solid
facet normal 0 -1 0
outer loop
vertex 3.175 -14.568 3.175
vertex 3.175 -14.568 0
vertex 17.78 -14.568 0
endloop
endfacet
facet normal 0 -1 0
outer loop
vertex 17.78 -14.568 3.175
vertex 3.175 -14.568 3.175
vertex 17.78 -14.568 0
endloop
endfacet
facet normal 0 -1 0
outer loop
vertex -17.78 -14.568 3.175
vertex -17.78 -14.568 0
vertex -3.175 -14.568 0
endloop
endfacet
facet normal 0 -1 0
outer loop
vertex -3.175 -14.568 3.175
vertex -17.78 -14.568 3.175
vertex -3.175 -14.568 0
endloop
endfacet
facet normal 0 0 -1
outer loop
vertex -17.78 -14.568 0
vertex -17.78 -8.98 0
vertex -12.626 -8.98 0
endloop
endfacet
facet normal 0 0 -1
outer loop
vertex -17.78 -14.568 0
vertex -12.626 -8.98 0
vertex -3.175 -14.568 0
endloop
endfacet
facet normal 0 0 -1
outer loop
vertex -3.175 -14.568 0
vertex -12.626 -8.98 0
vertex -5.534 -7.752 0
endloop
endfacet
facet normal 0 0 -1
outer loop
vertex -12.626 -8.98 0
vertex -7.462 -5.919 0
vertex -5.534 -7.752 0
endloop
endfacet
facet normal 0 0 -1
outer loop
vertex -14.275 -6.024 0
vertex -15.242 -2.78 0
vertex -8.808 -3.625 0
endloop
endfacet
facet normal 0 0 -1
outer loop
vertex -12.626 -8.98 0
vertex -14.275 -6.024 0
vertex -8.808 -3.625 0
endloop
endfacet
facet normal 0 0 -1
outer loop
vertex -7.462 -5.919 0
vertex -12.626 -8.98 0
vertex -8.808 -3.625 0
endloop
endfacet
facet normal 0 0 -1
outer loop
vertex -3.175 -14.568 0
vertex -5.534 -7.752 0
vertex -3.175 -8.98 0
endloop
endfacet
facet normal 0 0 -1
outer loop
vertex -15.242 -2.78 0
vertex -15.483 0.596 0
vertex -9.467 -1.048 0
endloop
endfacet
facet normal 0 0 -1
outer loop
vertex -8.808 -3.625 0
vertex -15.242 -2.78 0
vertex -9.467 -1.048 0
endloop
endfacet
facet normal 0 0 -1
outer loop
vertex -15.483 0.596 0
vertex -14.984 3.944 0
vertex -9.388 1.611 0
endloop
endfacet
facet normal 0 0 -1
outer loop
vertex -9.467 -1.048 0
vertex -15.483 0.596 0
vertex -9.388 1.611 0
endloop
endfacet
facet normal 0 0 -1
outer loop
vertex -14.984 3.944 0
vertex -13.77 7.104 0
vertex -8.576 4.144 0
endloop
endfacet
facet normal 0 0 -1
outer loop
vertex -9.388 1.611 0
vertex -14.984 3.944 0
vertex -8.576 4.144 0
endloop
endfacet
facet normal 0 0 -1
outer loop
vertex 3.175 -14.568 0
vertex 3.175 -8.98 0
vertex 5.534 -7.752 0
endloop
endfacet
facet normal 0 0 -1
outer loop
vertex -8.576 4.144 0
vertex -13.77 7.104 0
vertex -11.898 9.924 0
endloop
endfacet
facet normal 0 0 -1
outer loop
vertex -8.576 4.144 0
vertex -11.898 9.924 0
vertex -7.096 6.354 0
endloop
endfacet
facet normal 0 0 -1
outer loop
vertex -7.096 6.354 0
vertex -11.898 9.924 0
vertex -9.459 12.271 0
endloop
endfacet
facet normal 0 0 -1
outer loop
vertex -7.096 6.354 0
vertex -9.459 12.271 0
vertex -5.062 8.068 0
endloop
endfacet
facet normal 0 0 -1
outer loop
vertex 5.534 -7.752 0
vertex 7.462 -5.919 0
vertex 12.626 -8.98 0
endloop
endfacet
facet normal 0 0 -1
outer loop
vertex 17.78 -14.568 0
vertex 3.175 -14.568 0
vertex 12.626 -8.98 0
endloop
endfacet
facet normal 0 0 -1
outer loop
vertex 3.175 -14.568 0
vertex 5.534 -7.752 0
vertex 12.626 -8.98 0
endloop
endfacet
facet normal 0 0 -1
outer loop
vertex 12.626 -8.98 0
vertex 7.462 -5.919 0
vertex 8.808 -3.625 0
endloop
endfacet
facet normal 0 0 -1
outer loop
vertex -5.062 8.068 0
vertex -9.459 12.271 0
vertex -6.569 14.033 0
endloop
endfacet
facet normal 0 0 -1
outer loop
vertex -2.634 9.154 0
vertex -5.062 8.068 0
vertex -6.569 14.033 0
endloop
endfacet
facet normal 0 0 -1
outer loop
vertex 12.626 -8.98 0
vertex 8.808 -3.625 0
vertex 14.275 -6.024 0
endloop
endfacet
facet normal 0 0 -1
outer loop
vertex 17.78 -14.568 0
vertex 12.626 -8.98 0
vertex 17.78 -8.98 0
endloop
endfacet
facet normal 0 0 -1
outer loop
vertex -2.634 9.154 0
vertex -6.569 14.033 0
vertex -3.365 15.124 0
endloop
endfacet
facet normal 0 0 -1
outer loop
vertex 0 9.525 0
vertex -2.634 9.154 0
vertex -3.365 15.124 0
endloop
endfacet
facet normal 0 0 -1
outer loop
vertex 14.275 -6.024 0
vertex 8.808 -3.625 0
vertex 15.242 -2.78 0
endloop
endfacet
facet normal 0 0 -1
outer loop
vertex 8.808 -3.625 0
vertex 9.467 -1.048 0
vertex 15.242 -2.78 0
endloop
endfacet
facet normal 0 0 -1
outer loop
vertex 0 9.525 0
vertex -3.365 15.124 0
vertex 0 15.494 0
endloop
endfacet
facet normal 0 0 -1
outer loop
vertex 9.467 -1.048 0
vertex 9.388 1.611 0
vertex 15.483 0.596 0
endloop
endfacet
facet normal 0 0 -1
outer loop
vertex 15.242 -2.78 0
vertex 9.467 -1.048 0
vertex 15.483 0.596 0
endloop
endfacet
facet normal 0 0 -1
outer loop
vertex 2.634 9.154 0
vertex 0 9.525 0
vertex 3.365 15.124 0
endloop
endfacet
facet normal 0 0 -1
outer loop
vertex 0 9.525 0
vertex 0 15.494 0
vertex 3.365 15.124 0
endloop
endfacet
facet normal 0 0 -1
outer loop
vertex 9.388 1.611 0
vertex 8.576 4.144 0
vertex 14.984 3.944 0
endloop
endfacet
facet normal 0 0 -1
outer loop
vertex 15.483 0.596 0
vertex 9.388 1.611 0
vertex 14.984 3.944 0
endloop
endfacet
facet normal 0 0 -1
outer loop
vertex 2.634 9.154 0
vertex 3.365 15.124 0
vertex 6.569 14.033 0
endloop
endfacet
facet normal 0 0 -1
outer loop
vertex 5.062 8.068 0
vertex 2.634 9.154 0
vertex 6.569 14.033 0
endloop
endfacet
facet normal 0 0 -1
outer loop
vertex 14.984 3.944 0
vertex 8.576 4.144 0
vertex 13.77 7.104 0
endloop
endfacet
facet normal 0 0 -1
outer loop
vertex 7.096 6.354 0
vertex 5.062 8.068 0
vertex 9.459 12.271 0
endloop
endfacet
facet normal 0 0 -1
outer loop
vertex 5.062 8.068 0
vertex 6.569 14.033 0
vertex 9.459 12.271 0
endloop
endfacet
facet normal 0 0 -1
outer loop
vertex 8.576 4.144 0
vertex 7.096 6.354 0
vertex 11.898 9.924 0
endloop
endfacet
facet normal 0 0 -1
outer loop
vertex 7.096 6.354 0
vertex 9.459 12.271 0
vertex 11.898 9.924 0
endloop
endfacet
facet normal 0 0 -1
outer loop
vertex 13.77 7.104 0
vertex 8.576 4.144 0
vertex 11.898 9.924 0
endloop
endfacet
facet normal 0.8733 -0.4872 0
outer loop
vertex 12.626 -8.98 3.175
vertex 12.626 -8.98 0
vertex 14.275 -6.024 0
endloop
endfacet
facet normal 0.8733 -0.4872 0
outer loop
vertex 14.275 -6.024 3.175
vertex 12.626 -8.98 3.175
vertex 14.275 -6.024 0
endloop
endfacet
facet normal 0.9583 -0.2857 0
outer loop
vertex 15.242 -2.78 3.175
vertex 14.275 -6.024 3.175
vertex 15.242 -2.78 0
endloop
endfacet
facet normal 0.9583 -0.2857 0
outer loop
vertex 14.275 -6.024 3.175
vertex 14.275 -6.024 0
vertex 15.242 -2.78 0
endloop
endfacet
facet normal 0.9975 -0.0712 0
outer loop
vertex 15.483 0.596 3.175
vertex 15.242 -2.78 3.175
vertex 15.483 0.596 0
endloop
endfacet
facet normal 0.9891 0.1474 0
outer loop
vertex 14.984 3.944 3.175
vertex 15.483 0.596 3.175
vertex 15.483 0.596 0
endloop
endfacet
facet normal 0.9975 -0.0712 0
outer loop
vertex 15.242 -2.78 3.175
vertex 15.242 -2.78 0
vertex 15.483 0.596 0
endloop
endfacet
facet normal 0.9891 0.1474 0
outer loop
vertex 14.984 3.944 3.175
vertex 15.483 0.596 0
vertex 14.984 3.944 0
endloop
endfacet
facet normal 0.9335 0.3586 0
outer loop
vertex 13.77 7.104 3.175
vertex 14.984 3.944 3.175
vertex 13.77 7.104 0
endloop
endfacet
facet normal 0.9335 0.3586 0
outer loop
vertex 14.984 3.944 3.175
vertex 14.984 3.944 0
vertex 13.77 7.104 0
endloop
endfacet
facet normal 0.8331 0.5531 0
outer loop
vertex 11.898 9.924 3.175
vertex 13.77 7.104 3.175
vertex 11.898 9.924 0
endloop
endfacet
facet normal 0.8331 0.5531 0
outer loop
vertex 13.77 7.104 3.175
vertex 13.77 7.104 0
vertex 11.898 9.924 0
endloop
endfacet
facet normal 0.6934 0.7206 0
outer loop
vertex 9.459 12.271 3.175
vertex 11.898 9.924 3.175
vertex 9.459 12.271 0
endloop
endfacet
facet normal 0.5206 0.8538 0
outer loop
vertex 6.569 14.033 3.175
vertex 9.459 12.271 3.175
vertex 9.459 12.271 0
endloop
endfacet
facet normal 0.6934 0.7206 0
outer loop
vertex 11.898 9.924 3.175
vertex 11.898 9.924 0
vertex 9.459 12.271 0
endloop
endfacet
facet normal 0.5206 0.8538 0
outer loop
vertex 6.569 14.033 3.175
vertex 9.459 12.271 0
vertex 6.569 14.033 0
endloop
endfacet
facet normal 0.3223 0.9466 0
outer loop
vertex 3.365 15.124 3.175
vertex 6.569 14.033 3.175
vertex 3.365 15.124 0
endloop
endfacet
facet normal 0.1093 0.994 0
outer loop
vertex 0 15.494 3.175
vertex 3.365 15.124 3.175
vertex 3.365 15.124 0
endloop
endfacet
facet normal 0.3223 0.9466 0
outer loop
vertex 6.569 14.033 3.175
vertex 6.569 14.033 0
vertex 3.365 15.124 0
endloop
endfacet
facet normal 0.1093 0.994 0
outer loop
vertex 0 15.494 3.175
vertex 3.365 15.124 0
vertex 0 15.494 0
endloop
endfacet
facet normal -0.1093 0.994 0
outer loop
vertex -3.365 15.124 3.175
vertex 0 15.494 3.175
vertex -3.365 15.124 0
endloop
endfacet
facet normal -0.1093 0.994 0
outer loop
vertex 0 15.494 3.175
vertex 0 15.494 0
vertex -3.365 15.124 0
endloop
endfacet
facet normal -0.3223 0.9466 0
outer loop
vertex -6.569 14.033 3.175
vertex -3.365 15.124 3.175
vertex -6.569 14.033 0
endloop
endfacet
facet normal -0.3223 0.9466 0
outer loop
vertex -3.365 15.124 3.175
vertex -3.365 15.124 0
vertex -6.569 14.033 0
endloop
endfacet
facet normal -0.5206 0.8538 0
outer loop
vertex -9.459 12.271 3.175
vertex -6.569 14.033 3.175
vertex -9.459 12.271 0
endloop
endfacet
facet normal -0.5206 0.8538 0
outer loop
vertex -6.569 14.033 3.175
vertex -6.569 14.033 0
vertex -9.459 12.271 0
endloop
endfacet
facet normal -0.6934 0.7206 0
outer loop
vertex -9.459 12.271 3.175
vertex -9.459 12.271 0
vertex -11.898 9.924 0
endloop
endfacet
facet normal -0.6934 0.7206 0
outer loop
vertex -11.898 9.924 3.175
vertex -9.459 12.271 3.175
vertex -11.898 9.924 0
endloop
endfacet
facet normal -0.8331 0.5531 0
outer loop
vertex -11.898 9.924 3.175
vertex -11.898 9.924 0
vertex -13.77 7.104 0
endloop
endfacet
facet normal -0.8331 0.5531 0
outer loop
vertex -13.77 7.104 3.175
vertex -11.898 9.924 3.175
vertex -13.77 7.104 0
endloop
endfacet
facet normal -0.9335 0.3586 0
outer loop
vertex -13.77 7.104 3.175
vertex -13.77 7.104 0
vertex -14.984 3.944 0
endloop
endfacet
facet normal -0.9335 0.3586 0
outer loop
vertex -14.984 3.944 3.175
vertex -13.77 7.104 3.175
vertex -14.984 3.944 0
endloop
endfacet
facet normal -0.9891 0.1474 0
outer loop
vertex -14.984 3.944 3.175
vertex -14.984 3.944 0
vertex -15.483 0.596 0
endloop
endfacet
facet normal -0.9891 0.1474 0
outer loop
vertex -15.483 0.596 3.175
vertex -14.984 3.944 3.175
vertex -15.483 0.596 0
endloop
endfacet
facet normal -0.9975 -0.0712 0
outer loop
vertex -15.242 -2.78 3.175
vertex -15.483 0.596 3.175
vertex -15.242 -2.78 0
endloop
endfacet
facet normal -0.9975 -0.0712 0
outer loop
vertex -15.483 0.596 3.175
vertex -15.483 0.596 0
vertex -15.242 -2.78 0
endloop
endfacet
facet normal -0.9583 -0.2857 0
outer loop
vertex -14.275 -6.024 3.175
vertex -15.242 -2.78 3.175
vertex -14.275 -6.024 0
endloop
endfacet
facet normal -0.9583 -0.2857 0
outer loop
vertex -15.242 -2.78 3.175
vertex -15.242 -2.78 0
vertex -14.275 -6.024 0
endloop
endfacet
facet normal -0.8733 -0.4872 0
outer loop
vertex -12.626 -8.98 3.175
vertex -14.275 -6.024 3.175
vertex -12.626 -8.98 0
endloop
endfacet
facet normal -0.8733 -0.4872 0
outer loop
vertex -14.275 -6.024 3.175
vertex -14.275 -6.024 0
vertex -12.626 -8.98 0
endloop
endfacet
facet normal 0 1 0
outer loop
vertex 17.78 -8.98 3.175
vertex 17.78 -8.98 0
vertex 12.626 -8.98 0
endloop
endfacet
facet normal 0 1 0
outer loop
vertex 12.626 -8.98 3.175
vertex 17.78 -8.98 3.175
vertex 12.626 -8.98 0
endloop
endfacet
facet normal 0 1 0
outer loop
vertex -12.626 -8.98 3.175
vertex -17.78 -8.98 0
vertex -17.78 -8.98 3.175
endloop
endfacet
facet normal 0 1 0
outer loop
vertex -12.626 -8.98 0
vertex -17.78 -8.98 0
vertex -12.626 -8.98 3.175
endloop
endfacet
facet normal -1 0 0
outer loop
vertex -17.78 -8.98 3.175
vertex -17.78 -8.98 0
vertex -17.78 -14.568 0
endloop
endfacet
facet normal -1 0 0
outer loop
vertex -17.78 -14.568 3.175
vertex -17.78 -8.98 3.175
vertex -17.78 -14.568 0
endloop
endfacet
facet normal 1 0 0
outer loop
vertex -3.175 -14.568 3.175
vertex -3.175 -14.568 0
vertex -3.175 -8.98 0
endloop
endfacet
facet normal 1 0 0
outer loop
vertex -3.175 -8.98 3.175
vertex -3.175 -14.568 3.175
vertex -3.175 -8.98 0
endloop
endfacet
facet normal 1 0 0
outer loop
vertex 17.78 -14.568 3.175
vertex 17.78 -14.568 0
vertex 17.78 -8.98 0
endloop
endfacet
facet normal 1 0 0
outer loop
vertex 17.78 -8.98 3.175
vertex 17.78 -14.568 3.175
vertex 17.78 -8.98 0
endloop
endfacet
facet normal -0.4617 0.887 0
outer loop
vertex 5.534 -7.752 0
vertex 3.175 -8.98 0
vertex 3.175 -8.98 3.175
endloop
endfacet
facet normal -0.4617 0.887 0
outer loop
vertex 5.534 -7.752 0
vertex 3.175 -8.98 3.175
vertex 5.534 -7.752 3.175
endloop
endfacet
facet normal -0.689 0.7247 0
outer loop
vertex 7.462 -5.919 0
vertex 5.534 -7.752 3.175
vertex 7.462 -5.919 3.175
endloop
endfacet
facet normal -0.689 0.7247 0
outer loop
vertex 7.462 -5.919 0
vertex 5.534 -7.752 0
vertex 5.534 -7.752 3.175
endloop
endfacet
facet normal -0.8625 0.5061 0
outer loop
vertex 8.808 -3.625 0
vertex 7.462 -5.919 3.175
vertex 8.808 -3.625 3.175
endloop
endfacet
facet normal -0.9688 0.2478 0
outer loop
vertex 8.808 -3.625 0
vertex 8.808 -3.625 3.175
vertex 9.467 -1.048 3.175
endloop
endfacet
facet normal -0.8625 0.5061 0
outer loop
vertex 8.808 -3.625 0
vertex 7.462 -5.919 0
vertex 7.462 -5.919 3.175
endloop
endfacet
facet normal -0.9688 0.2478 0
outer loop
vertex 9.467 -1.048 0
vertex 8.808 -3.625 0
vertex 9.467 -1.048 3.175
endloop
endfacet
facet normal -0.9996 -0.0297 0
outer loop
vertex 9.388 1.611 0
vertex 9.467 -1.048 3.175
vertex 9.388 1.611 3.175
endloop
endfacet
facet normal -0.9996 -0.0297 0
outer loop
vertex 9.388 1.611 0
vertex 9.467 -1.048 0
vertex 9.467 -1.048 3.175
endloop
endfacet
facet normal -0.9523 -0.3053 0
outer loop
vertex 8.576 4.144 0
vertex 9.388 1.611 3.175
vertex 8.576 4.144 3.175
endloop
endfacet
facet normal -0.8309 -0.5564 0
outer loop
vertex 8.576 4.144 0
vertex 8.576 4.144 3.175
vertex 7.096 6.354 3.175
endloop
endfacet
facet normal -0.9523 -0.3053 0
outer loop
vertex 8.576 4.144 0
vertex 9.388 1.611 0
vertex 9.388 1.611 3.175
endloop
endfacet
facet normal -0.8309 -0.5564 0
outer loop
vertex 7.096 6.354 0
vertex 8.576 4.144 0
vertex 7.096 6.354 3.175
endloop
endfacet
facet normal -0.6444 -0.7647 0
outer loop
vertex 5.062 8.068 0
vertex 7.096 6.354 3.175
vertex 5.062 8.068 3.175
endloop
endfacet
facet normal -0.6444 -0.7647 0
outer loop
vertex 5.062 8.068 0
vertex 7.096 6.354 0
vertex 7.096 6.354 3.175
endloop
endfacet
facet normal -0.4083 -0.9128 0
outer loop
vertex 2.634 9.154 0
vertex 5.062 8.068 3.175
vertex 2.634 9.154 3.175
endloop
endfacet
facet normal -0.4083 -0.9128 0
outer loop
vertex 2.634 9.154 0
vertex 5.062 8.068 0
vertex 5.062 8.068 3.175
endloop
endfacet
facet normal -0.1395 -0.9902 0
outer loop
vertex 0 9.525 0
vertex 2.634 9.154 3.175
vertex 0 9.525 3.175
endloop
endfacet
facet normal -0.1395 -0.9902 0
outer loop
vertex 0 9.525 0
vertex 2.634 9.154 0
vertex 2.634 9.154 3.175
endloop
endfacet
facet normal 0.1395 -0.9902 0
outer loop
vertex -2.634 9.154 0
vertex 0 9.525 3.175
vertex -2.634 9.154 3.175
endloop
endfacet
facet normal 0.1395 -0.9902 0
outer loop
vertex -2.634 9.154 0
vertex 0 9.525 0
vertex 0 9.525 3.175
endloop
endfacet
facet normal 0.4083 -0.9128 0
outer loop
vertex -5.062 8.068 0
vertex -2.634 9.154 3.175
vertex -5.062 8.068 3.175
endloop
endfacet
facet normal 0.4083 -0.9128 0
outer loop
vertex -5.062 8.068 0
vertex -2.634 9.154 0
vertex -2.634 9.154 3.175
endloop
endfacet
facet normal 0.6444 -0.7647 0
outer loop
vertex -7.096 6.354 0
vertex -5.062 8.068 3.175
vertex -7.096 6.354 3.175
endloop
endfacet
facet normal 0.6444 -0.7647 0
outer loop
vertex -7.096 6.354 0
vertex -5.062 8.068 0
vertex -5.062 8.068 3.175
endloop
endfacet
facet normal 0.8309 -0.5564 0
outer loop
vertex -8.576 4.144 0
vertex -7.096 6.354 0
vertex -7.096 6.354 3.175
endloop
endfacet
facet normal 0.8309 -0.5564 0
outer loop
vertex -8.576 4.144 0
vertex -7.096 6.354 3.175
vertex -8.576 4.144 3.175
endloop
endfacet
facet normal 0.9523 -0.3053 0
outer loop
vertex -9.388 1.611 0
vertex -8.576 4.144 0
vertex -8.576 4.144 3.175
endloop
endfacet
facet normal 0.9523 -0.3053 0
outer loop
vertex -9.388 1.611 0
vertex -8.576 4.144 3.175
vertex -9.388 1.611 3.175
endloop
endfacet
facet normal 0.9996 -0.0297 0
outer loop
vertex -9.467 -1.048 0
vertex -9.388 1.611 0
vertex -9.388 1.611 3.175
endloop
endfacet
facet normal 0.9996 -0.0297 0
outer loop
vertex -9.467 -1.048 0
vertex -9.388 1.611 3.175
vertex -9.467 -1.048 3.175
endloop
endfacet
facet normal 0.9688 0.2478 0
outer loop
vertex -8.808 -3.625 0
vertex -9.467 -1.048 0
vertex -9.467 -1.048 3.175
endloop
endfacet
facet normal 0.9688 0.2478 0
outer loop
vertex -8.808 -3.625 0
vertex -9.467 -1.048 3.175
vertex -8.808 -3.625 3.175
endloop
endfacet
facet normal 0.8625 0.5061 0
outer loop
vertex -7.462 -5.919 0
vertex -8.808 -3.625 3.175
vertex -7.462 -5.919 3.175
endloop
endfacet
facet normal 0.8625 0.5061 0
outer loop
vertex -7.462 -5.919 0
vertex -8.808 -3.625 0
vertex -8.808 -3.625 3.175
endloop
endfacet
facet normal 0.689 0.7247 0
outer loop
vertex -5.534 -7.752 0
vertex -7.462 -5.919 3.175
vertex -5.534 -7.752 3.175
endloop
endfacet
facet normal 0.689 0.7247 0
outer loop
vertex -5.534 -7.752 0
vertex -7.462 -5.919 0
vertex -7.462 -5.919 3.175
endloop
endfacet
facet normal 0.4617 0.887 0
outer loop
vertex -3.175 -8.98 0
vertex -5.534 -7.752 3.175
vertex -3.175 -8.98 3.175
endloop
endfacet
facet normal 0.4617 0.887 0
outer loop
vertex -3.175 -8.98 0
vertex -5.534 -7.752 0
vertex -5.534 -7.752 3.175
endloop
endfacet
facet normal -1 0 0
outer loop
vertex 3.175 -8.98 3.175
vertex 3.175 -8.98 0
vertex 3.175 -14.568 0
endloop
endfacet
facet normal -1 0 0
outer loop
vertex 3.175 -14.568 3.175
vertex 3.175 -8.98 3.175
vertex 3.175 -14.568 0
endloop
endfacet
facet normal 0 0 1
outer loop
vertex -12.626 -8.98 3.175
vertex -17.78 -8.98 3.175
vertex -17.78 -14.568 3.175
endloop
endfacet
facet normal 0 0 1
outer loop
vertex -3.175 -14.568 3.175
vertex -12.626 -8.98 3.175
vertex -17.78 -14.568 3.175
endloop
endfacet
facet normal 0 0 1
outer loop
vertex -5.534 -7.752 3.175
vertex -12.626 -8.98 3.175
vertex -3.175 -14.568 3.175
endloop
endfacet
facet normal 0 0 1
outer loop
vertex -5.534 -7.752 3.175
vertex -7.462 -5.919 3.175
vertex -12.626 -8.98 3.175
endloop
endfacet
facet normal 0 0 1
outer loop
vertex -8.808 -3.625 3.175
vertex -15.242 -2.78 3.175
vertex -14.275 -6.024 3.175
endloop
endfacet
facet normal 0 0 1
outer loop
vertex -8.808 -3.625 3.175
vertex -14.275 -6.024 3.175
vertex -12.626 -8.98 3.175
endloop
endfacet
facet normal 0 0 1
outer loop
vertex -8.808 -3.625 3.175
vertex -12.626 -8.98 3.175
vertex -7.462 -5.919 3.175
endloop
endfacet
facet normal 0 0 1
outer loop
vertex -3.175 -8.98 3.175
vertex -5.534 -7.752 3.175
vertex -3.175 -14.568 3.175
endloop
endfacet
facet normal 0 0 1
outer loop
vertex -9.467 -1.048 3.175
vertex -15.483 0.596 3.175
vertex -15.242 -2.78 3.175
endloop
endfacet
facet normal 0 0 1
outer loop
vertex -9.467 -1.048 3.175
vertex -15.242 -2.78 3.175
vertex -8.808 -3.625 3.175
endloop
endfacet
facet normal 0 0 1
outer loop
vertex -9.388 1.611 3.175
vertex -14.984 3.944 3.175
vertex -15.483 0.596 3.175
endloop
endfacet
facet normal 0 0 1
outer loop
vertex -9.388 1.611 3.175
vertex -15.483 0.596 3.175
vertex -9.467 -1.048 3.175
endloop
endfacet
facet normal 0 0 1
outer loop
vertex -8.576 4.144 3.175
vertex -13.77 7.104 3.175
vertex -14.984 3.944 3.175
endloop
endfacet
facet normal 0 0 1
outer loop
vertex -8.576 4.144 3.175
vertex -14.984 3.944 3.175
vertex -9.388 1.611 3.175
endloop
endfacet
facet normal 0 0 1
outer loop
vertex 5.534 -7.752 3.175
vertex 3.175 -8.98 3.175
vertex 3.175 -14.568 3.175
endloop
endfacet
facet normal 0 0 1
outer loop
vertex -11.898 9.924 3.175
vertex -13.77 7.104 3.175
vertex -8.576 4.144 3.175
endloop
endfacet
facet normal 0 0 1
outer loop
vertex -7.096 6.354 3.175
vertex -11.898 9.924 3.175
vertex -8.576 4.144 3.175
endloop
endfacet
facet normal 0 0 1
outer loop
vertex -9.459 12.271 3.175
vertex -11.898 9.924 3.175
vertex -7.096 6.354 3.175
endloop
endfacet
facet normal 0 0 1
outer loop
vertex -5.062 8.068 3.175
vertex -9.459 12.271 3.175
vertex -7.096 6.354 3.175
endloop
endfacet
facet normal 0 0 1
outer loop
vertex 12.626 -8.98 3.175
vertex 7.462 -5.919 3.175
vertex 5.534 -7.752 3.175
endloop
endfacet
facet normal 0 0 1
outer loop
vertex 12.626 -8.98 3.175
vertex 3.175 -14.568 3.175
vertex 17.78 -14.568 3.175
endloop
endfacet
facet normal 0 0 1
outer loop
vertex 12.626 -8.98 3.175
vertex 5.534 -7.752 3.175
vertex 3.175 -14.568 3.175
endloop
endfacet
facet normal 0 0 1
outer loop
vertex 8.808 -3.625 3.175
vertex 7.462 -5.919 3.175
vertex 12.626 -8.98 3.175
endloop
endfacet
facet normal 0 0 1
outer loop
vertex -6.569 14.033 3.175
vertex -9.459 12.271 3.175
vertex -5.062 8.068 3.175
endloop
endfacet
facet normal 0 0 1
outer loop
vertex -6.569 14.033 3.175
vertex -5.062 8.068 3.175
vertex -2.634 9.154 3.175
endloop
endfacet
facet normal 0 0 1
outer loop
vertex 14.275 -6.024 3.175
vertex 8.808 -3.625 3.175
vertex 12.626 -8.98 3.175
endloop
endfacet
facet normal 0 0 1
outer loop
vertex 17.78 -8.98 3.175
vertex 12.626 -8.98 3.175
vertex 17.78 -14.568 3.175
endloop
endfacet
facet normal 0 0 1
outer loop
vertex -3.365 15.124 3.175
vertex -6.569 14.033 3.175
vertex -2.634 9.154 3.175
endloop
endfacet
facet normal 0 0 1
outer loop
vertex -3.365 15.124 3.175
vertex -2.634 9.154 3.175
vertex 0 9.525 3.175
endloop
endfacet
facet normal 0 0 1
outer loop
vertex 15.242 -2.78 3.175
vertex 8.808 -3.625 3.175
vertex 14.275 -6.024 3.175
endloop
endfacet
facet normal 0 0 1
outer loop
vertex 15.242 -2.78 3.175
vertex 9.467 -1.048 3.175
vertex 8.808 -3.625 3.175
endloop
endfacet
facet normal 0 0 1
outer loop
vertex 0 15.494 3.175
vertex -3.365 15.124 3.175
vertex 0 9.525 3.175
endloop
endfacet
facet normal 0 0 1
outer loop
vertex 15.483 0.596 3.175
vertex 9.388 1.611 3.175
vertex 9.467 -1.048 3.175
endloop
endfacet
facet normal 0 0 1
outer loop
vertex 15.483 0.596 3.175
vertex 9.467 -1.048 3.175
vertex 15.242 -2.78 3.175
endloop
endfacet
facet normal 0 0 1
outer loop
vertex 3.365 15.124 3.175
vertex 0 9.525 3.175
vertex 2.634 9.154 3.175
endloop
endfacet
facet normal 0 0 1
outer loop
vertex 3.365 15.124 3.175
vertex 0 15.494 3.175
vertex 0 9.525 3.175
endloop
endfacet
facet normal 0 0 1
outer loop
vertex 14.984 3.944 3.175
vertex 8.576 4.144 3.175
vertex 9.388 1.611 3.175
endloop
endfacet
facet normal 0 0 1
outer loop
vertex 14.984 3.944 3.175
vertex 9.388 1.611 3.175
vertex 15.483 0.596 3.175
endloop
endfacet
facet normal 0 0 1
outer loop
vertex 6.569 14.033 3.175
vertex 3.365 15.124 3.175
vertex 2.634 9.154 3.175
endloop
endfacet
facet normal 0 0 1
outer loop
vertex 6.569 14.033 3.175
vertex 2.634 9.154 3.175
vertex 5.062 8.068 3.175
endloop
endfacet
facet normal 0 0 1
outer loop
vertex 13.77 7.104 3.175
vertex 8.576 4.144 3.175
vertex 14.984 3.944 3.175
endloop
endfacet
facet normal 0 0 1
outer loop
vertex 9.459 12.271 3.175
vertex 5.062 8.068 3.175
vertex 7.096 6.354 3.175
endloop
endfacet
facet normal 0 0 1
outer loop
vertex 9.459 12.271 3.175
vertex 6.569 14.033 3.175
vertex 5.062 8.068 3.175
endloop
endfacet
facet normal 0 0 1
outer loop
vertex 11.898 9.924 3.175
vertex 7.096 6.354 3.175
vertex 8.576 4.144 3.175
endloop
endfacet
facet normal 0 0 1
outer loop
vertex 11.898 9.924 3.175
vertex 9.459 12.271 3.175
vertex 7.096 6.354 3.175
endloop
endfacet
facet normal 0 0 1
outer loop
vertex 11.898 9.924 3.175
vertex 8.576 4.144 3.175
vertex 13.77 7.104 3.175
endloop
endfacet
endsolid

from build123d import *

# Parameters (mm, degrees)
PAD_DEPTH = 3.175


with BuildPart() as part:
    # Sketch → Pad (new body)
    with BuildSketch(Plane.XY):
        with BuildLine():
            Line((-17.78, -8.980256), (-17.78, -14.568256))
            Line((-17.78, -14.568256), (-3.175, -14.568256))
            Line((-3.175, -14.568256), (-3.175, -8.980256))
            ThreePointArc((3.175, -8.980256), (0, 9.525), (-3.175, -8.980256))
            Line((3.175, -8.980256), (3.175, -14.568256))
            Line((3.175, -14.568256), (17.78, -14.568256))
            Line((17.78, -14.568256), (17.78, -8.980256))
            Line((17.78, -8.980256), (12.626125, -8.980256))
            ThreePointArc((12.626125, -8.980256), (0, 15.494), (-12.626125, -8.980256))
            Line((-17.78, -8.980256), (-12.626125, -8.980256))
        make_face()
    extrude(amount=PAD_DEPTH)


solid = part.part
